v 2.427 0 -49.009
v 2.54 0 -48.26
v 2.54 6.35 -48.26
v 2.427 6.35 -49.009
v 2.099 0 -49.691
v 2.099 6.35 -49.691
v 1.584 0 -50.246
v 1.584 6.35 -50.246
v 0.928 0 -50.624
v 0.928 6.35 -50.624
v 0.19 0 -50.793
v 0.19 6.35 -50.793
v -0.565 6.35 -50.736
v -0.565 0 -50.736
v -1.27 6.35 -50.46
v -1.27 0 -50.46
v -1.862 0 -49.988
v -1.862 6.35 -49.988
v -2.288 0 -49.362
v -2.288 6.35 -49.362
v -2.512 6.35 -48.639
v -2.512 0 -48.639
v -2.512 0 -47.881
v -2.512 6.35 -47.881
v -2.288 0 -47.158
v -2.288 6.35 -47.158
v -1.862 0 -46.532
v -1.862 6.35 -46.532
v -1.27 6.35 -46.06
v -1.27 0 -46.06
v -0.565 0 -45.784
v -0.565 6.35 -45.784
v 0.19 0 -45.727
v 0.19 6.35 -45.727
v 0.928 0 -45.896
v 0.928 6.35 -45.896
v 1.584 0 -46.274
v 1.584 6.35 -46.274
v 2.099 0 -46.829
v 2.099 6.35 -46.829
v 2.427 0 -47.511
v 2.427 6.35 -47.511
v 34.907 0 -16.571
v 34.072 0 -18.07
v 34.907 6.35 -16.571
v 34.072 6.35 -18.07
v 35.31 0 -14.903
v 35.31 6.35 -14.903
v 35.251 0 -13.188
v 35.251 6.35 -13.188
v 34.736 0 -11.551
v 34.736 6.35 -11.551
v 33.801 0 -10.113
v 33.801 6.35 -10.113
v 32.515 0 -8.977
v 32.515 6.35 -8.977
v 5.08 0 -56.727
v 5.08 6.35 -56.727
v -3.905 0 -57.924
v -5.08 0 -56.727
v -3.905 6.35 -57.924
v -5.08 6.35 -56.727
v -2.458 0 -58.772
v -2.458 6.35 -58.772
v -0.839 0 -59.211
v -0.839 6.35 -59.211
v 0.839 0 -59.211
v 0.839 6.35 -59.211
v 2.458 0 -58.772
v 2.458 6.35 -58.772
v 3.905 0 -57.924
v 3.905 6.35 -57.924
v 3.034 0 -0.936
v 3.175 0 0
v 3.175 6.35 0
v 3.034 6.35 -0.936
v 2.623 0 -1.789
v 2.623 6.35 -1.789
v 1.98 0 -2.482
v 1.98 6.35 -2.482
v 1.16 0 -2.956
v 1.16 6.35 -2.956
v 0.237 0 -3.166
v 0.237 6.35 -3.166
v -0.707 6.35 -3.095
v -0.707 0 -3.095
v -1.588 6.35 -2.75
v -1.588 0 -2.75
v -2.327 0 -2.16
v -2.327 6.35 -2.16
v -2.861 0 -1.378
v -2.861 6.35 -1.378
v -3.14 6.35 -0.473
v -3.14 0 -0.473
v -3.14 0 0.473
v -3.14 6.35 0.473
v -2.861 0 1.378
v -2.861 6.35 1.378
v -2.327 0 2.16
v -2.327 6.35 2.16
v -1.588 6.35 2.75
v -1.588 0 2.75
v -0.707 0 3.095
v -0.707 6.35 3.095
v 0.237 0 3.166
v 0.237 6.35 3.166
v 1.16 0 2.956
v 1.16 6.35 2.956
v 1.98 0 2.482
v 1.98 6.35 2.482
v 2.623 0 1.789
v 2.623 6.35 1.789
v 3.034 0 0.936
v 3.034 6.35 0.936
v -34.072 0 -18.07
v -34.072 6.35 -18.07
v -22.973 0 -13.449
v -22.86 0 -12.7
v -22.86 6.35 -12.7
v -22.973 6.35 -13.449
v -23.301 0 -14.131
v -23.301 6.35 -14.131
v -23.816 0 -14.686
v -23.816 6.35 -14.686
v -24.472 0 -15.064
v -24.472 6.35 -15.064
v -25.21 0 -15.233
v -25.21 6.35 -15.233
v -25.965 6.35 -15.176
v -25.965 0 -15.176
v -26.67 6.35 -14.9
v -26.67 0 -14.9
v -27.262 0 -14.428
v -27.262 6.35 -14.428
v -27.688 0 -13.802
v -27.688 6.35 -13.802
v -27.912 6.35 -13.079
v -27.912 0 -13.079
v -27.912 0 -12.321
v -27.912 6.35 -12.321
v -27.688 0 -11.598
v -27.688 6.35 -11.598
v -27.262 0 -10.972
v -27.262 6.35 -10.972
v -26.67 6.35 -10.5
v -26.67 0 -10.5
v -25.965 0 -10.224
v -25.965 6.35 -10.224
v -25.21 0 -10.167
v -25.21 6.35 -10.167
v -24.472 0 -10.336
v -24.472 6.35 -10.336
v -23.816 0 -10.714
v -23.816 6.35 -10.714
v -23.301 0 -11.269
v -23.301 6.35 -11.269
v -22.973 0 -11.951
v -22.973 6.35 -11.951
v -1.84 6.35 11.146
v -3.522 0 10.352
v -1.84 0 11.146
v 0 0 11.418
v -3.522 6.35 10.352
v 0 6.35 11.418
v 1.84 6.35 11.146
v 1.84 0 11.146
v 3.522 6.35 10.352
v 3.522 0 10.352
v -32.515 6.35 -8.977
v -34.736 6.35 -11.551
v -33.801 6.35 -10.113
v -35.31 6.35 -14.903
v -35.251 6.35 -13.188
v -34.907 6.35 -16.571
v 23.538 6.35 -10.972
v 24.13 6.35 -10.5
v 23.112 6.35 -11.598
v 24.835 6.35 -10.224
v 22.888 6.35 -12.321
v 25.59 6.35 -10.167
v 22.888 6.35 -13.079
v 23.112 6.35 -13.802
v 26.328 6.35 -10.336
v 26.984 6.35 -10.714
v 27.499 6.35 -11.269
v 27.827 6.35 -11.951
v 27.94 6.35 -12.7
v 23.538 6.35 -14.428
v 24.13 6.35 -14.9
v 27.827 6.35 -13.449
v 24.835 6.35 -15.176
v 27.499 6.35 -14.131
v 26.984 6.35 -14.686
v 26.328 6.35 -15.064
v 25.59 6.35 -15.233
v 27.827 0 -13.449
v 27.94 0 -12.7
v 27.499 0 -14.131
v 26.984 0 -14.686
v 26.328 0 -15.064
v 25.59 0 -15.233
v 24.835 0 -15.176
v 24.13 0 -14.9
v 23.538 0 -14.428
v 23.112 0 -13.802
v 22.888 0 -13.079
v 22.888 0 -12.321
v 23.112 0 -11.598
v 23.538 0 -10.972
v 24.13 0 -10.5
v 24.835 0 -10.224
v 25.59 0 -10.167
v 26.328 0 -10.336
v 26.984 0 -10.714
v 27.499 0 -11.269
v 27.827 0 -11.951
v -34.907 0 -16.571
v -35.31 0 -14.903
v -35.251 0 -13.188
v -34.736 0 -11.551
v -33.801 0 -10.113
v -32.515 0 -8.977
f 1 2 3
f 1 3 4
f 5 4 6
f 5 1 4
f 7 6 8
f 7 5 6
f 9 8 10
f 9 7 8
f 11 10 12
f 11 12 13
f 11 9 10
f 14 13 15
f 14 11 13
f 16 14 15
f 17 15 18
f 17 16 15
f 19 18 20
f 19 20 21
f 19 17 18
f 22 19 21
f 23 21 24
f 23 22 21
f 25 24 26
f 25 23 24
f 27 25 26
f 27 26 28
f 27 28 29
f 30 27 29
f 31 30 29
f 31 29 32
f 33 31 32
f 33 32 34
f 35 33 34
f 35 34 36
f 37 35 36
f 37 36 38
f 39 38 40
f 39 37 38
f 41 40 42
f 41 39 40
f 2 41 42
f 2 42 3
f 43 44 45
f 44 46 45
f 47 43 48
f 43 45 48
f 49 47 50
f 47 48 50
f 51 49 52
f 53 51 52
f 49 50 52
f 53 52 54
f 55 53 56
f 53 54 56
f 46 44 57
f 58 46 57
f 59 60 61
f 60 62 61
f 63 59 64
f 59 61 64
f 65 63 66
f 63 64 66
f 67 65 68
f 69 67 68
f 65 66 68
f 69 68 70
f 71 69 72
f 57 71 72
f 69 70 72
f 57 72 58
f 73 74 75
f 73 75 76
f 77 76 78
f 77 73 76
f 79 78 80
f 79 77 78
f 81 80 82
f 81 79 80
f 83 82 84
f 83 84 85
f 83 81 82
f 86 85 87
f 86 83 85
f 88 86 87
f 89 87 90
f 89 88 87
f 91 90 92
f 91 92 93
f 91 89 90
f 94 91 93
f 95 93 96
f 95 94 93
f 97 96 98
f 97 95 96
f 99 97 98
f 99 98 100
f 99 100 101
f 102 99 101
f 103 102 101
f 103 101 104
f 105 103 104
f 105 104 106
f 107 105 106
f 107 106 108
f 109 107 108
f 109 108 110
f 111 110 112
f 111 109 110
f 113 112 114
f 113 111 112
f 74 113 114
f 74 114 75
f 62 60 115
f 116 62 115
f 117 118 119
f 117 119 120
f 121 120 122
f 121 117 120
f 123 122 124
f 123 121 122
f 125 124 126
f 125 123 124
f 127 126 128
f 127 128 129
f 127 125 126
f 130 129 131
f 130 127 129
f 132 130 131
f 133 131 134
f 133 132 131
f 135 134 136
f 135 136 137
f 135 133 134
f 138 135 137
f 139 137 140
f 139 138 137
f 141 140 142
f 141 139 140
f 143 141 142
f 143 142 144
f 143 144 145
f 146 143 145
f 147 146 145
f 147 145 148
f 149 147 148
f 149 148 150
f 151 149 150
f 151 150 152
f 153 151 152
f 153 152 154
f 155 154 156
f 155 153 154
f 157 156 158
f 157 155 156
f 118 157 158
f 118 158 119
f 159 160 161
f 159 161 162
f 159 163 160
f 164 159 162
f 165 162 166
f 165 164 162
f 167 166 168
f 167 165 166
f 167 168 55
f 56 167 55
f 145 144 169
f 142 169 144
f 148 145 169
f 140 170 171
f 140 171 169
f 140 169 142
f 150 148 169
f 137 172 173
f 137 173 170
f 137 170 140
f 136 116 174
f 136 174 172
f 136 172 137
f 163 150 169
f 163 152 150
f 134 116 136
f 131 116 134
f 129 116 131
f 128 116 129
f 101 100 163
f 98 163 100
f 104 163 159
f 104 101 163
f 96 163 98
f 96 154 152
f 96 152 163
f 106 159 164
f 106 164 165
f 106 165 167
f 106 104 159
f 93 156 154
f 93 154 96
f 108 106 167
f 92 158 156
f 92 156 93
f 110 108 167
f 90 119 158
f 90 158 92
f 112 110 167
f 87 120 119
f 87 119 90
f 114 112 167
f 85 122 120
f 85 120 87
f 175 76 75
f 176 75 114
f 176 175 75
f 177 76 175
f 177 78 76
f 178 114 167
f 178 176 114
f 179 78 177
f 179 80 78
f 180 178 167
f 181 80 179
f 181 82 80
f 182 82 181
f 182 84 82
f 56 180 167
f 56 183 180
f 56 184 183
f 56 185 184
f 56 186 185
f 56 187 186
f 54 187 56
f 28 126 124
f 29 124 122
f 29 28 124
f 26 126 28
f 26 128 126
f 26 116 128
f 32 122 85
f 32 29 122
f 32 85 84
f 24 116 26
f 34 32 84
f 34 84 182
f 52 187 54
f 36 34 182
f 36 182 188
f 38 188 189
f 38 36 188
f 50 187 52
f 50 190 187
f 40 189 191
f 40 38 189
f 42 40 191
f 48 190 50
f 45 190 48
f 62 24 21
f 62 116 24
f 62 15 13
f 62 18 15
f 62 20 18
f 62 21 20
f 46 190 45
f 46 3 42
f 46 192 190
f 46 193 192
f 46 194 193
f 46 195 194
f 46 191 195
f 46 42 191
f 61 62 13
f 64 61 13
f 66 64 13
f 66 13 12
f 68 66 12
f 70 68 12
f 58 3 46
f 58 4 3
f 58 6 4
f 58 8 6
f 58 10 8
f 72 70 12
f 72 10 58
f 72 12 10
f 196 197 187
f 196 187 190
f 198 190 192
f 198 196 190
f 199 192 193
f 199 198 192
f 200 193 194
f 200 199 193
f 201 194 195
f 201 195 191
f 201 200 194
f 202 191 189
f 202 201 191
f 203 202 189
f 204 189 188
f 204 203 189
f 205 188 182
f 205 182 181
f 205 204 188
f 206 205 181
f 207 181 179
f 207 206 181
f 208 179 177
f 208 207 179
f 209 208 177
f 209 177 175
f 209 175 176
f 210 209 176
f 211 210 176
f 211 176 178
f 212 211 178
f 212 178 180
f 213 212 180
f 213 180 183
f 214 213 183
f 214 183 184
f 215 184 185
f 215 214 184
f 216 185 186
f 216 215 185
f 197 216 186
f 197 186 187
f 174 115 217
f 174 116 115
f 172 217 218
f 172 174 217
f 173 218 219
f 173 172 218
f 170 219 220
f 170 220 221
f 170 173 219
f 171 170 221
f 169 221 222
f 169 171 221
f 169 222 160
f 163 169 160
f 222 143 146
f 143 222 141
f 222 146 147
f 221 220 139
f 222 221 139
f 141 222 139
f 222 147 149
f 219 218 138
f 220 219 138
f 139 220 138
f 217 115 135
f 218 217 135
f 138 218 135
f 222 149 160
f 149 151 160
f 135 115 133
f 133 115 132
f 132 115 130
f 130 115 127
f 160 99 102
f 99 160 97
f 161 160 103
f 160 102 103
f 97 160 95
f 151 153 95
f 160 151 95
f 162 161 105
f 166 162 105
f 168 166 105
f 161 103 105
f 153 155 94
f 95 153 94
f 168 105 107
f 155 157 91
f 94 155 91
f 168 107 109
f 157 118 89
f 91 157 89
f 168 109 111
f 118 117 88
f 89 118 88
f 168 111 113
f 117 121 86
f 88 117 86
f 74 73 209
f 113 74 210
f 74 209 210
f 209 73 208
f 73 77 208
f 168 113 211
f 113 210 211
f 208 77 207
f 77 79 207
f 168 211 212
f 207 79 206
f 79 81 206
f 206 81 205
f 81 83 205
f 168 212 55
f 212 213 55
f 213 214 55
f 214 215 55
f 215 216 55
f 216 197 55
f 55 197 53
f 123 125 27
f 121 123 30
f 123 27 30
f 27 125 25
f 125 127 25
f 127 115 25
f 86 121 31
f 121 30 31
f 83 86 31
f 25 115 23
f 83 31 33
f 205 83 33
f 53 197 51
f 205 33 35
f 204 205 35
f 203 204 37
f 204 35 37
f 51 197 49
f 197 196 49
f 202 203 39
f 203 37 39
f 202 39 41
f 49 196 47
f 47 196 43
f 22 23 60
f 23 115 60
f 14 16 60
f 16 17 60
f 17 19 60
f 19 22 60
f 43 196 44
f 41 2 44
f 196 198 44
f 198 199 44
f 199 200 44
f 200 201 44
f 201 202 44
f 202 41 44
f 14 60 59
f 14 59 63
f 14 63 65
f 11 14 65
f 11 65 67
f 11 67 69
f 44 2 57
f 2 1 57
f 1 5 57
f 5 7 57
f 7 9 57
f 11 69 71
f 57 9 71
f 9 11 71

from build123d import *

# Parameters (mm, degrees)
SKETCH2_R           = 3.175
SKETCH2_R_2         = 2.54
BOSS_EXTRUDE2_DEPTH = 6.35
FILLET3_R           = 6.35


with BuildPart() as part:
    # Sketch2 → Boss-Extrude2 (new body)
    with BuildSketch(Plane(origin=(0, 0, 0), x_dir=(1, 0, 0), z_dir=(0, 1, 0))):
        Polygon((0, 63.5), (-38.1, 12.7), (0, -12.7), (38.1, 12.7), align=None)
        Circle(SKETCH2_R, mode=Mode.SUBTRACT)
        with Locations((-25.4, 12.7)):
            Circle(SKETCH2_R_2, mode=Mode.SUBTRACT)
        with Locations((0, 48.26)):
            Circle(SKETCH2_R_2, mode=Mode.SUBTRACT)
        with Locations((25.4, 12.7)):
            Circle(SKETCH2_R_2, mode=Mode.SUBTRACT)
    extrude(amount=BOSS_EXTRUDE2_DEPTH)

    # Fillet3
    fillet3_edges = [part.edges().sort_by_distance(p)[0] for p in [
        (0, 3.175, 12.7),
        (-38.1, 3.175, -12.7),
        (0, 3.175, -63.5),
        (38.1, 3.175, -12.7),
    ]]
    fillet(fillet3_edges, radius=FILLET3_R)


solid = part.part
